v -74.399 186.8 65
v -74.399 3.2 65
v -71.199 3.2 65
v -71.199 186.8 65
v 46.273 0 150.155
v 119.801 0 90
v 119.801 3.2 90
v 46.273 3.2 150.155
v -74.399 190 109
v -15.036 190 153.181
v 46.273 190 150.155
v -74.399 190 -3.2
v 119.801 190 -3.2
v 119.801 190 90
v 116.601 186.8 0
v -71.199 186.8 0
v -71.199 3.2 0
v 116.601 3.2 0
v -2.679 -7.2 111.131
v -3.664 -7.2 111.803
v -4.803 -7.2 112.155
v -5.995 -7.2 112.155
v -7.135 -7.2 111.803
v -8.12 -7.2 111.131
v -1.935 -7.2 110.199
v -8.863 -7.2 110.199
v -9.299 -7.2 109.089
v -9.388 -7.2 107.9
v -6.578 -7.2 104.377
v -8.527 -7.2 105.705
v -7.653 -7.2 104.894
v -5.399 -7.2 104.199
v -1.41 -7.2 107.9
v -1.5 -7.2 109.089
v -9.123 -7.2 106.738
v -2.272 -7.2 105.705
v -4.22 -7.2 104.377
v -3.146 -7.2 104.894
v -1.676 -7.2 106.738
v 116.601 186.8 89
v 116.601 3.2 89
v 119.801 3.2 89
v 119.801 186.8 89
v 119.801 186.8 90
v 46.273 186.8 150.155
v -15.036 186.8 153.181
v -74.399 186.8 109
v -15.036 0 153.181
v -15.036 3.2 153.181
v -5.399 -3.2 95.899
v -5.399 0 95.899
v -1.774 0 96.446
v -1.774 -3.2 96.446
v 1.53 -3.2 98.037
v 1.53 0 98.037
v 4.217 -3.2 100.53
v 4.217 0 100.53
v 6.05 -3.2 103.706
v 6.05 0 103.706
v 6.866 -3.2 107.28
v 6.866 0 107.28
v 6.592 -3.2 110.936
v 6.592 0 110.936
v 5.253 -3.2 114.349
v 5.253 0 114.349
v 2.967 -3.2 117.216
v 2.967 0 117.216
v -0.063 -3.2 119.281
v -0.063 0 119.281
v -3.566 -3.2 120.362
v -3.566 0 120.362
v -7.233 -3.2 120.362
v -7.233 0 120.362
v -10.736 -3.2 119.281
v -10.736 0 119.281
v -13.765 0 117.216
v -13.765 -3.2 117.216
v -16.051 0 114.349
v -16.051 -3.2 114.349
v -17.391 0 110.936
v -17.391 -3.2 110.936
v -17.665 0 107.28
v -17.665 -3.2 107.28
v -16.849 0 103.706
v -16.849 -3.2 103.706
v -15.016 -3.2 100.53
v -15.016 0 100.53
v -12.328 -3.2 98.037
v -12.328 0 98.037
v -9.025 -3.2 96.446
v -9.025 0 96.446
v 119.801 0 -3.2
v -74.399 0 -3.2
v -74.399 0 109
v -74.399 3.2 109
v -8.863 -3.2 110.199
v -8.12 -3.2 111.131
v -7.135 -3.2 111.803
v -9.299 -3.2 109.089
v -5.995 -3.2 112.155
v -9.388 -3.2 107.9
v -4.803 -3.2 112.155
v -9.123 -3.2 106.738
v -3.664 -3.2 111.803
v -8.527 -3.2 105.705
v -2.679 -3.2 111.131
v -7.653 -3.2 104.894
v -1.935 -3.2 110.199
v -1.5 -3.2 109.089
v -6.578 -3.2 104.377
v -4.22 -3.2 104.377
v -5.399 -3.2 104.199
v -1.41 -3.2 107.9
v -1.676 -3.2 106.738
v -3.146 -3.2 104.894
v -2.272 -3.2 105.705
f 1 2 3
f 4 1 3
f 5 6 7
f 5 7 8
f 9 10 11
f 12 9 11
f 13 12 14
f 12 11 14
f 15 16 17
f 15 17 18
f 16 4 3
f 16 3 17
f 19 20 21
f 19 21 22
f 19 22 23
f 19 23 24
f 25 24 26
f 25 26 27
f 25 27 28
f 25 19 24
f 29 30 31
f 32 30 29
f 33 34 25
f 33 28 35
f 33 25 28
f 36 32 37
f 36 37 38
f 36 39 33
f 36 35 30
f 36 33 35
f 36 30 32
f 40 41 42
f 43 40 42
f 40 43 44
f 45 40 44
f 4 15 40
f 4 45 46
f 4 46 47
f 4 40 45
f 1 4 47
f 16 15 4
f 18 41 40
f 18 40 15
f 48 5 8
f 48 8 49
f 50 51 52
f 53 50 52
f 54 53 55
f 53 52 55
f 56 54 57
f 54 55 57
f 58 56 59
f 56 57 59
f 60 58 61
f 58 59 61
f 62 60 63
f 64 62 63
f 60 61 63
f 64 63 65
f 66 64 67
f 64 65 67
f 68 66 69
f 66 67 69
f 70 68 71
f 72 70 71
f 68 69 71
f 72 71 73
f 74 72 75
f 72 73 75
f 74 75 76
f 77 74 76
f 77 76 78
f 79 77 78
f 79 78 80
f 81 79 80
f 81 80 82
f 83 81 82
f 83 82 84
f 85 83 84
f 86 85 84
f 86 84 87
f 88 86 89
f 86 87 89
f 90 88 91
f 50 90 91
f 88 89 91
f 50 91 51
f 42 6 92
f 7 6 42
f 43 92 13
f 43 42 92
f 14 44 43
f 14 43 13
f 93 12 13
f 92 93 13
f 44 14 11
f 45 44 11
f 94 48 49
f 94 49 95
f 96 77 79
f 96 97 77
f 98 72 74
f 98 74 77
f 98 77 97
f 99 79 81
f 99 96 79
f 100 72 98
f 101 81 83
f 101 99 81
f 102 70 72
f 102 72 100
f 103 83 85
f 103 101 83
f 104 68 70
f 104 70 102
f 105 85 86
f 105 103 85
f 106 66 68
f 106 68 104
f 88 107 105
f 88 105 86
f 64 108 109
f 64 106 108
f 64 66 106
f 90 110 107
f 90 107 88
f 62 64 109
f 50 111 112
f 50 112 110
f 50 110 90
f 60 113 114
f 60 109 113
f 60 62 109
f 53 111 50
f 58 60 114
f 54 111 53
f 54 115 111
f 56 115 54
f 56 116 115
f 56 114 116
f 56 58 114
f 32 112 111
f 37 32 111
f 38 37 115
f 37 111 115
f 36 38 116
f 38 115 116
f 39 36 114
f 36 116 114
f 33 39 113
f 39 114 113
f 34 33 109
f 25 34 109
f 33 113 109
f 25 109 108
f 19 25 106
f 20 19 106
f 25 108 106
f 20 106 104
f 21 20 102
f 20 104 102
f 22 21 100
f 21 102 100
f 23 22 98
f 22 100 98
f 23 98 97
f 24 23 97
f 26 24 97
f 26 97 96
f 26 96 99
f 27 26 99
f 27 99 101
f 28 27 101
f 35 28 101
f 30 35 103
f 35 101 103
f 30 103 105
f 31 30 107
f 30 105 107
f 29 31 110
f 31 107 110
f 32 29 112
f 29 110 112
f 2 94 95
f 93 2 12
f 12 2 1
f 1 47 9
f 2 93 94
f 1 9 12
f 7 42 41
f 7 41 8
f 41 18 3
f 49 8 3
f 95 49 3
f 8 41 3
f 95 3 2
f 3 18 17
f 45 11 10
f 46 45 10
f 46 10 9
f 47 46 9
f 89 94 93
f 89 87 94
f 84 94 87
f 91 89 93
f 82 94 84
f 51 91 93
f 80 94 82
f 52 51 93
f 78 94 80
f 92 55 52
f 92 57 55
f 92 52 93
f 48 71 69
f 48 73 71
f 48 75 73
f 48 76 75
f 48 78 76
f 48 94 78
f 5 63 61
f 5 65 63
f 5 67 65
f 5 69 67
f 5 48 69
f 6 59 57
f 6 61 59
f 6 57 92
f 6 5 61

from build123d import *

# Parameters (mm, degrees)
BOSS_EXTRUDE1_DEPTH = 3.2
SKETCH3_R           = 12.3
BOSS_EXTRUDE2_DEPTH = 3.2
SKETCH4_R           = 4
BOSS_EXTRUDE3_DEPTH = 4
SKETCH6_W           = 3.2
SKETCH6_H           = 65
BOSS_EXTRUDE4_DEPTH = 190
SKETCH8_W           = 3.2
SKETCH8_H           = 89
BOSS_EXTRUDE5_DEPTH = 190
SKETCH9_W           = 194.2
SKETCH9_H           = 190
BOSS_EXTRUDE7_DEPTH = 3.2


with BuildPart() as part:
    # Sketch1 → Boss-Extrude1 (new body)
    with BuildSketch(Plane(origin=(0, 0, 0), x_dir=(1, 0, 0), z_dir=(0, 1, 0))):
        Polygon((-71.199297972, 0), (119.800702028, 0), (119.800702028, -90), (46.272924854, -150.155348756), (-15.035731115, -153.181069815), (-74.399297972, -109), (-74.399297972, -65), (-71.199297972, -65), align=None)
    boss_extrude1 = extrude(amount=BOSS_EXTRUDE1_DEPTH)

    # Sketch3 → Boss-Extrude2 (add)
    with BuildSketch(Plane.XZ):
        with Locations(Location((-5.399297972, 108.199281837, 0), (0, 0, 270))):
            Circle(SKETCH3_R)
    extrude(amount=BOSS_EXTRUDE2_DEPTH)

    # Sketch4 → Boss-Extrude3 (add)
    with BuildSketch(Plane.XZ.offset(3.2)):
        with Locations(Location((-5.399297972, 108.199281837, 0), (0, 0, 270))):
            Circle(SKETCH4_R)
    extrude(amount=BOSS_EXTRUDE3_DEPTH)

    # Sketch6 → Boss-Extrude4 (add)
    with BuildSketch(Plane(origin=(0, 0, 0), x_dir=(1, 0, 0), z_dir=(0, 1, 0))):
        with Locations((-72.799297972, -32.5)):
            Rectangle(SKETCH6_W, SKETCH6_H)
    extrude(amount=BOSS_EXTRUDE4_DEPTH)

    # Sketch8 → Boss-Extrude5 (add)
    with BuildSketch(Plane(origin=(0, 0, 0), x_dir=(1, 0, 0), z_dir=(0, 1, 0))):
        with Locations((118.200702028, -44.5)):
            Rectangle(SKETCH8_W, SKETCH8_H)
    extrude(amount=BOSS_EXTRUDE5_DEPTH)

    # Mirror1: Boss-Extrude1 across plane
    add(boss_extrude1.mirror(Plane(origin=(0, 95, 0), x_dir=(0, 0, 1), z_dir=(0, -1, 0))))

    # Sketch9 → Boss-Extrude7 (add)
    with BuildSketch(Plane.XY):
        with Locations((22.700702028, 95)):
            Rectangle(SKETCH9_W, SKETCH9_H)
    extrude(amount=-BOSS_EXTRUDE7_DEPTH)


solid = part.part
